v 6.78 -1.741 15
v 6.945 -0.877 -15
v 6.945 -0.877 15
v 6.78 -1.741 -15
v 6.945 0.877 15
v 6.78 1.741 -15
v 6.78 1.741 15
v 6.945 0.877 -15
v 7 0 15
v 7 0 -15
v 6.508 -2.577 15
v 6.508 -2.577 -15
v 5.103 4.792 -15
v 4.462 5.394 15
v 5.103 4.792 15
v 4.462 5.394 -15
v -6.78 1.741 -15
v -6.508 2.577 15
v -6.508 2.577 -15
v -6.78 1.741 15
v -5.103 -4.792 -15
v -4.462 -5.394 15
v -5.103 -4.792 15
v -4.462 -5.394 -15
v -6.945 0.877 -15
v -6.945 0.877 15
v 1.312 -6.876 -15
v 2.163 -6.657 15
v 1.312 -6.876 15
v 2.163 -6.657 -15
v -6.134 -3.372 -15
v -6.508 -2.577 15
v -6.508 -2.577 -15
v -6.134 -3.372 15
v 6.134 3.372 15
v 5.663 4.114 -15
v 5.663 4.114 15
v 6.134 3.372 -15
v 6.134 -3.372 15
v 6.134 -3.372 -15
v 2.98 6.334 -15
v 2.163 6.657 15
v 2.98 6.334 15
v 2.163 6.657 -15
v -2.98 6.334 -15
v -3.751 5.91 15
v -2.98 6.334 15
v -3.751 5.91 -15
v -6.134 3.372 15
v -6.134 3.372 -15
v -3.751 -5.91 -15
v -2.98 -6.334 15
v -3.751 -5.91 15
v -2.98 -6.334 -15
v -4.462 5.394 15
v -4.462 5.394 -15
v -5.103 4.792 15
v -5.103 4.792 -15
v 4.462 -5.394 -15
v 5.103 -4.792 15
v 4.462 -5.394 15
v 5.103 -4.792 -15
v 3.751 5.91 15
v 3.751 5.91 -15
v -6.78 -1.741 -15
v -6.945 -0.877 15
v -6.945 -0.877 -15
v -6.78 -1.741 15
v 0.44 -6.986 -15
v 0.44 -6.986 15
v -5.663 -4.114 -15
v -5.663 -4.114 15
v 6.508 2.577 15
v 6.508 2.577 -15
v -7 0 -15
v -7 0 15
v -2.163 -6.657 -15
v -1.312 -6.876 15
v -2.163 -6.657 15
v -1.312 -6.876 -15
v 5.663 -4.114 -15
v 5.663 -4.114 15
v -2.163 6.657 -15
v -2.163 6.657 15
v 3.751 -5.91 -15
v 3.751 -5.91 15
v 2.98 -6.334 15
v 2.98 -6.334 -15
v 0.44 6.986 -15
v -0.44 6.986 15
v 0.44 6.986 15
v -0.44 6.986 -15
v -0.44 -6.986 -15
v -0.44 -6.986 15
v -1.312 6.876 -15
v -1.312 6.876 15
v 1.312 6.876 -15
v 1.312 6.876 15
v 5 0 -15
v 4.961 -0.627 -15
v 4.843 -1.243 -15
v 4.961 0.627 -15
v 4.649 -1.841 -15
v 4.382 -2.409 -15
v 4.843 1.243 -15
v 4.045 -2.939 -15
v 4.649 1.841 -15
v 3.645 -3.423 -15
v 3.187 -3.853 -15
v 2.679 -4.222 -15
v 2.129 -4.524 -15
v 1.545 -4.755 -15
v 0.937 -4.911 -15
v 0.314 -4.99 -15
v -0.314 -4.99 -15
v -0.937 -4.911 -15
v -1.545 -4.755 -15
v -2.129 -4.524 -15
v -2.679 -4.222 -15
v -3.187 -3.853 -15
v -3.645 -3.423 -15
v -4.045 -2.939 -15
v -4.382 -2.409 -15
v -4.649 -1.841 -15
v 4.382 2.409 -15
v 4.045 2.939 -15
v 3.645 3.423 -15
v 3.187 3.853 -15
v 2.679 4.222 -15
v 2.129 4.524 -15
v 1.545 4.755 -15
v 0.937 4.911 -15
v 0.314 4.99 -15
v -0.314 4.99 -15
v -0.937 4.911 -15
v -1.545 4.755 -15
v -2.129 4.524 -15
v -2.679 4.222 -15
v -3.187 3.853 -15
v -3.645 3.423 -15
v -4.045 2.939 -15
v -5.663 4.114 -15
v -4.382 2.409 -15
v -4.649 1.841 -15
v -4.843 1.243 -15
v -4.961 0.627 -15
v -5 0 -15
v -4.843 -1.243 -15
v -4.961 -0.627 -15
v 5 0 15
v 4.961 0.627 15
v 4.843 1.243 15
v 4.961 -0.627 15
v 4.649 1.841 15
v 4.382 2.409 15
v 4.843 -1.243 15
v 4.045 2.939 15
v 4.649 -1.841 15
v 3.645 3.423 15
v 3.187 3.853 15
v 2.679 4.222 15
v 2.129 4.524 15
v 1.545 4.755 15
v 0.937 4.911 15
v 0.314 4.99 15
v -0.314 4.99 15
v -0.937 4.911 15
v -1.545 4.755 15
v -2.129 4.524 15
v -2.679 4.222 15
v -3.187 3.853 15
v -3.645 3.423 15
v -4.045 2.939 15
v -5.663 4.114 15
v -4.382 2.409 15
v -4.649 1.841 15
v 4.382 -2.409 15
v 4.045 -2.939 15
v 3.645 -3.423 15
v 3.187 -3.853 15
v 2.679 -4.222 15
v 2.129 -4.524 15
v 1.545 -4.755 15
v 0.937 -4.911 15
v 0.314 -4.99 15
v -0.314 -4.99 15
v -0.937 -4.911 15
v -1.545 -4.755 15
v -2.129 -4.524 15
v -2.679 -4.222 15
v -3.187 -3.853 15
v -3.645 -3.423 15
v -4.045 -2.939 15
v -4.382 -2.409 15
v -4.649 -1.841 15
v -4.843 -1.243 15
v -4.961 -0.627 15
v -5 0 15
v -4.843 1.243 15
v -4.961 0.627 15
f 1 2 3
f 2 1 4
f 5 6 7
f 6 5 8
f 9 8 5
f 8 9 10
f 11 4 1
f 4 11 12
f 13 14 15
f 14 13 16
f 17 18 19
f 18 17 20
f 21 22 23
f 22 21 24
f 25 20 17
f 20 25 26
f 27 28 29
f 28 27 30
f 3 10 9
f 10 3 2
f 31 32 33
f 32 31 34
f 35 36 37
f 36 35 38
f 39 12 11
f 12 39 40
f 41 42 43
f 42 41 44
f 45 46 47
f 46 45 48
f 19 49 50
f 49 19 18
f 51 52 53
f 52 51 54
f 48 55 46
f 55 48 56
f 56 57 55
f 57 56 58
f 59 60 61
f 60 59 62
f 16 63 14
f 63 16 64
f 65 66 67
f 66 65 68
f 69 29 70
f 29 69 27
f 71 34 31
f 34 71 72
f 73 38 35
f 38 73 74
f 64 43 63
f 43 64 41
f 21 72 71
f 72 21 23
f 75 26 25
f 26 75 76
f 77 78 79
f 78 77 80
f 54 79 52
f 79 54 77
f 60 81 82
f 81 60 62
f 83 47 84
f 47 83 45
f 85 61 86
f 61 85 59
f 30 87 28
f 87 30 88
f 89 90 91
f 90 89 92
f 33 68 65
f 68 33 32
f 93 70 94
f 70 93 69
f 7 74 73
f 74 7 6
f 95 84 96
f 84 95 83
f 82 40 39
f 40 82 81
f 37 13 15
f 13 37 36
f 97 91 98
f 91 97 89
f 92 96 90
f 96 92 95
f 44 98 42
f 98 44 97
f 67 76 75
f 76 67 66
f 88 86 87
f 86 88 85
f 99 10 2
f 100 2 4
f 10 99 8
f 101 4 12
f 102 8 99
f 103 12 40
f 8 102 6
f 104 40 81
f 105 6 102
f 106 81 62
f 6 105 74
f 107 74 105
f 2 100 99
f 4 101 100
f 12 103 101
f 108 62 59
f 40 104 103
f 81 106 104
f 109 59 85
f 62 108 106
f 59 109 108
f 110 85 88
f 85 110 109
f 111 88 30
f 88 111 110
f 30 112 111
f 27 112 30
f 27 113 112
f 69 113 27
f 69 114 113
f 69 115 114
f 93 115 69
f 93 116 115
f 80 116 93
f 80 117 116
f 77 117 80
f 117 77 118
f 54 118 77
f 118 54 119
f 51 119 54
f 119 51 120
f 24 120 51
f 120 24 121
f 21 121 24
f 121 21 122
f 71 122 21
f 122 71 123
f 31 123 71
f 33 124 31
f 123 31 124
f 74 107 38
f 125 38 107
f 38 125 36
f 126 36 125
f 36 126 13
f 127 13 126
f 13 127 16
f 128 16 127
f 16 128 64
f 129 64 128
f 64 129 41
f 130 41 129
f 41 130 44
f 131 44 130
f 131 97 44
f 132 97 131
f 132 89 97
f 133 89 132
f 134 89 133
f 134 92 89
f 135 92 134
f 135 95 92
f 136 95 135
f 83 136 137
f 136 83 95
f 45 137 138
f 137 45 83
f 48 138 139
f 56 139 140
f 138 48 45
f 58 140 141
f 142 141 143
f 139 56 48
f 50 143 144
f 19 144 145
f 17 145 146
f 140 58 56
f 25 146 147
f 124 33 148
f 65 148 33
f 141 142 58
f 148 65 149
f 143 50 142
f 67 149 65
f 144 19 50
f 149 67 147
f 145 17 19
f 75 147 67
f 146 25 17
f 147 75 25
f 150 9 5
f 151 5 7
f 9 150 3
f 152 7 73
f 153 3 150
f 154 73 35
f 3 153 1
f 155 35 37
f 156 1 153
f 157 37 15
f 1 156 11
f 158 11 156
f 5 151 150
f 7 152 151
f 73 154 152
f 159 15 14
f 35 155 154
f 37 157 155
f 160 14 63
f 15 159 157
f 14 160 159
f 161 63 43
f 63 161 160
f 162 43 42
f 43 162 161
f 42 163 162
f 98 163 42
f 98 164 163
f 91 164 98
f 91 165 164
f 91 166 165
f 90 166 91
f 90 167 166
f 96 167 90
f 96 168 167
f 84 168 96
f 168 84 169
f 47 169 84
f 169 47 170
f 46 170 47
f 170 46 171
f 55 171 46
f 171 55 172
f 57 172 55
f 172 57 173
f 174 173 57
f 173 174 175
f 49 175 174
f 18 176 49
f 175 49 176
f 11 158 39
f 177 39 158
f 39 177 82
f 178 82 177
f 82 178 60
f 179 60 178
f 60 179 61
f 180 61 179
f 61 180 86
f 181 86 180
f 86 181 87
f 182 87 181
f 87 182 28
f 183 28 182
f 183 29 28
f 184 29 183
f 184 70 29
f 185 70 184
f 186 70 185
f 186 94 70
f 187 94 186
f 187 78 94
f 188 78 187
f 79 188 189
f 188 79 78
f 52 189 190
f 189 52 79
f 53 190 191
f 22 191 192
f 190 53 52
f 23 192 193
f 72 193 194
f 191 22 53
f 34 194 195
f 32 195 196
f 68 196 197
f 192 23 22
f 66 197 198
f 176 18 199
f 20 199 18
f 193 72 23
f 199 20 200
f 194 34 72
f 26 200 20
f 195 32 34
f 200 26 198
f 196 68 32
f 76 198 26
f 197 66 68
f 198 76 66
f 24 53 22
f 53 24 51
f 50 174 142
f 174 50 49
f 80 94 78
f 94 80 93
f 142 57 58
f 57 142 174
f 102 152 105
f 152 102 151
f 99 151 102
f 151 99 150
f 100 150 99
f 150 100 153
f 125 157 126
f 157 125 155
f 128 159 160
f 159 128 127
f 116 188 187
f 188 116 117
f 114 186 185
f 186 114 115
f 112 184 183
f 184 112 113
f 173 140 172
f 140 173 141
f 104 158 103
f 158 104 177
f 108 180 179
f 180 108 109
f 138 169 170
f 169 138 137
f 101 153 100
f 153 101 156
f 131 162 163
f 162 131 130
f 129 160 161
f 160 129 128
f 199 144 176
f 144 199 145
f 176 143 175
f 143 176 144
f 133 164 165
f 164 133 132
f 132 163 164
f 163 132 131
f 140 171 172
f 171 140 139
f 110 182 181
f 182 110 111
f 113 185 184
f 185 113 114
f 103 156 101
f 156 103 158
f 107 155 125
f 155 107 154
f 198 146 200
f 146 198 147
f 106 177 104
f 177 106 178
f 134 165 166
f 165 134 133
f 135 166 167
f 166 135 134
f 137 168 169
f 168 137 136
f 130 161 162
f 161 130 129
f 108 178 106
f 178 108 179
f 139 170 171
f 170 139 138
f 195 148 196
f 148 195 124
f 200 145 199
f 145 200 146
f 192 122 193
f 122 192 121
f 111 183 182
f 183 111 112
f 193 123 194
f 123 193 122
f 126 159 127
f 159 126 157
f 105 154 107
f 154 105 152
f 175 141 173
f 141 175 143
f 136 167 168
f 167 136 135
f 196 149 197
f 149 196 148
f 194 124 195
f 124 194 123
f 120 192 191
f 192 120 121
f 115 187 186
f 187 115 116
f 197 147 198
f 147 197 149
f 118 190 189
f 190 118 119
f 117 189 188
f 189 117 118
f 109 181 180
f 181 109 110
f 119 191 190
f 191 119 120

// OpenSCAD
$fn = 50;


difference() {
	union() {
		translate(v = [0, 0, -15.0000000000]) {
			cylinder(h = 30, r = 7.0000000000);
		}
	}
	union() {
		translate(v = [0, 0, -100.0000000000]) {
			cylinder(h = 200, r = 5.0000000000);
		}
	}
}
